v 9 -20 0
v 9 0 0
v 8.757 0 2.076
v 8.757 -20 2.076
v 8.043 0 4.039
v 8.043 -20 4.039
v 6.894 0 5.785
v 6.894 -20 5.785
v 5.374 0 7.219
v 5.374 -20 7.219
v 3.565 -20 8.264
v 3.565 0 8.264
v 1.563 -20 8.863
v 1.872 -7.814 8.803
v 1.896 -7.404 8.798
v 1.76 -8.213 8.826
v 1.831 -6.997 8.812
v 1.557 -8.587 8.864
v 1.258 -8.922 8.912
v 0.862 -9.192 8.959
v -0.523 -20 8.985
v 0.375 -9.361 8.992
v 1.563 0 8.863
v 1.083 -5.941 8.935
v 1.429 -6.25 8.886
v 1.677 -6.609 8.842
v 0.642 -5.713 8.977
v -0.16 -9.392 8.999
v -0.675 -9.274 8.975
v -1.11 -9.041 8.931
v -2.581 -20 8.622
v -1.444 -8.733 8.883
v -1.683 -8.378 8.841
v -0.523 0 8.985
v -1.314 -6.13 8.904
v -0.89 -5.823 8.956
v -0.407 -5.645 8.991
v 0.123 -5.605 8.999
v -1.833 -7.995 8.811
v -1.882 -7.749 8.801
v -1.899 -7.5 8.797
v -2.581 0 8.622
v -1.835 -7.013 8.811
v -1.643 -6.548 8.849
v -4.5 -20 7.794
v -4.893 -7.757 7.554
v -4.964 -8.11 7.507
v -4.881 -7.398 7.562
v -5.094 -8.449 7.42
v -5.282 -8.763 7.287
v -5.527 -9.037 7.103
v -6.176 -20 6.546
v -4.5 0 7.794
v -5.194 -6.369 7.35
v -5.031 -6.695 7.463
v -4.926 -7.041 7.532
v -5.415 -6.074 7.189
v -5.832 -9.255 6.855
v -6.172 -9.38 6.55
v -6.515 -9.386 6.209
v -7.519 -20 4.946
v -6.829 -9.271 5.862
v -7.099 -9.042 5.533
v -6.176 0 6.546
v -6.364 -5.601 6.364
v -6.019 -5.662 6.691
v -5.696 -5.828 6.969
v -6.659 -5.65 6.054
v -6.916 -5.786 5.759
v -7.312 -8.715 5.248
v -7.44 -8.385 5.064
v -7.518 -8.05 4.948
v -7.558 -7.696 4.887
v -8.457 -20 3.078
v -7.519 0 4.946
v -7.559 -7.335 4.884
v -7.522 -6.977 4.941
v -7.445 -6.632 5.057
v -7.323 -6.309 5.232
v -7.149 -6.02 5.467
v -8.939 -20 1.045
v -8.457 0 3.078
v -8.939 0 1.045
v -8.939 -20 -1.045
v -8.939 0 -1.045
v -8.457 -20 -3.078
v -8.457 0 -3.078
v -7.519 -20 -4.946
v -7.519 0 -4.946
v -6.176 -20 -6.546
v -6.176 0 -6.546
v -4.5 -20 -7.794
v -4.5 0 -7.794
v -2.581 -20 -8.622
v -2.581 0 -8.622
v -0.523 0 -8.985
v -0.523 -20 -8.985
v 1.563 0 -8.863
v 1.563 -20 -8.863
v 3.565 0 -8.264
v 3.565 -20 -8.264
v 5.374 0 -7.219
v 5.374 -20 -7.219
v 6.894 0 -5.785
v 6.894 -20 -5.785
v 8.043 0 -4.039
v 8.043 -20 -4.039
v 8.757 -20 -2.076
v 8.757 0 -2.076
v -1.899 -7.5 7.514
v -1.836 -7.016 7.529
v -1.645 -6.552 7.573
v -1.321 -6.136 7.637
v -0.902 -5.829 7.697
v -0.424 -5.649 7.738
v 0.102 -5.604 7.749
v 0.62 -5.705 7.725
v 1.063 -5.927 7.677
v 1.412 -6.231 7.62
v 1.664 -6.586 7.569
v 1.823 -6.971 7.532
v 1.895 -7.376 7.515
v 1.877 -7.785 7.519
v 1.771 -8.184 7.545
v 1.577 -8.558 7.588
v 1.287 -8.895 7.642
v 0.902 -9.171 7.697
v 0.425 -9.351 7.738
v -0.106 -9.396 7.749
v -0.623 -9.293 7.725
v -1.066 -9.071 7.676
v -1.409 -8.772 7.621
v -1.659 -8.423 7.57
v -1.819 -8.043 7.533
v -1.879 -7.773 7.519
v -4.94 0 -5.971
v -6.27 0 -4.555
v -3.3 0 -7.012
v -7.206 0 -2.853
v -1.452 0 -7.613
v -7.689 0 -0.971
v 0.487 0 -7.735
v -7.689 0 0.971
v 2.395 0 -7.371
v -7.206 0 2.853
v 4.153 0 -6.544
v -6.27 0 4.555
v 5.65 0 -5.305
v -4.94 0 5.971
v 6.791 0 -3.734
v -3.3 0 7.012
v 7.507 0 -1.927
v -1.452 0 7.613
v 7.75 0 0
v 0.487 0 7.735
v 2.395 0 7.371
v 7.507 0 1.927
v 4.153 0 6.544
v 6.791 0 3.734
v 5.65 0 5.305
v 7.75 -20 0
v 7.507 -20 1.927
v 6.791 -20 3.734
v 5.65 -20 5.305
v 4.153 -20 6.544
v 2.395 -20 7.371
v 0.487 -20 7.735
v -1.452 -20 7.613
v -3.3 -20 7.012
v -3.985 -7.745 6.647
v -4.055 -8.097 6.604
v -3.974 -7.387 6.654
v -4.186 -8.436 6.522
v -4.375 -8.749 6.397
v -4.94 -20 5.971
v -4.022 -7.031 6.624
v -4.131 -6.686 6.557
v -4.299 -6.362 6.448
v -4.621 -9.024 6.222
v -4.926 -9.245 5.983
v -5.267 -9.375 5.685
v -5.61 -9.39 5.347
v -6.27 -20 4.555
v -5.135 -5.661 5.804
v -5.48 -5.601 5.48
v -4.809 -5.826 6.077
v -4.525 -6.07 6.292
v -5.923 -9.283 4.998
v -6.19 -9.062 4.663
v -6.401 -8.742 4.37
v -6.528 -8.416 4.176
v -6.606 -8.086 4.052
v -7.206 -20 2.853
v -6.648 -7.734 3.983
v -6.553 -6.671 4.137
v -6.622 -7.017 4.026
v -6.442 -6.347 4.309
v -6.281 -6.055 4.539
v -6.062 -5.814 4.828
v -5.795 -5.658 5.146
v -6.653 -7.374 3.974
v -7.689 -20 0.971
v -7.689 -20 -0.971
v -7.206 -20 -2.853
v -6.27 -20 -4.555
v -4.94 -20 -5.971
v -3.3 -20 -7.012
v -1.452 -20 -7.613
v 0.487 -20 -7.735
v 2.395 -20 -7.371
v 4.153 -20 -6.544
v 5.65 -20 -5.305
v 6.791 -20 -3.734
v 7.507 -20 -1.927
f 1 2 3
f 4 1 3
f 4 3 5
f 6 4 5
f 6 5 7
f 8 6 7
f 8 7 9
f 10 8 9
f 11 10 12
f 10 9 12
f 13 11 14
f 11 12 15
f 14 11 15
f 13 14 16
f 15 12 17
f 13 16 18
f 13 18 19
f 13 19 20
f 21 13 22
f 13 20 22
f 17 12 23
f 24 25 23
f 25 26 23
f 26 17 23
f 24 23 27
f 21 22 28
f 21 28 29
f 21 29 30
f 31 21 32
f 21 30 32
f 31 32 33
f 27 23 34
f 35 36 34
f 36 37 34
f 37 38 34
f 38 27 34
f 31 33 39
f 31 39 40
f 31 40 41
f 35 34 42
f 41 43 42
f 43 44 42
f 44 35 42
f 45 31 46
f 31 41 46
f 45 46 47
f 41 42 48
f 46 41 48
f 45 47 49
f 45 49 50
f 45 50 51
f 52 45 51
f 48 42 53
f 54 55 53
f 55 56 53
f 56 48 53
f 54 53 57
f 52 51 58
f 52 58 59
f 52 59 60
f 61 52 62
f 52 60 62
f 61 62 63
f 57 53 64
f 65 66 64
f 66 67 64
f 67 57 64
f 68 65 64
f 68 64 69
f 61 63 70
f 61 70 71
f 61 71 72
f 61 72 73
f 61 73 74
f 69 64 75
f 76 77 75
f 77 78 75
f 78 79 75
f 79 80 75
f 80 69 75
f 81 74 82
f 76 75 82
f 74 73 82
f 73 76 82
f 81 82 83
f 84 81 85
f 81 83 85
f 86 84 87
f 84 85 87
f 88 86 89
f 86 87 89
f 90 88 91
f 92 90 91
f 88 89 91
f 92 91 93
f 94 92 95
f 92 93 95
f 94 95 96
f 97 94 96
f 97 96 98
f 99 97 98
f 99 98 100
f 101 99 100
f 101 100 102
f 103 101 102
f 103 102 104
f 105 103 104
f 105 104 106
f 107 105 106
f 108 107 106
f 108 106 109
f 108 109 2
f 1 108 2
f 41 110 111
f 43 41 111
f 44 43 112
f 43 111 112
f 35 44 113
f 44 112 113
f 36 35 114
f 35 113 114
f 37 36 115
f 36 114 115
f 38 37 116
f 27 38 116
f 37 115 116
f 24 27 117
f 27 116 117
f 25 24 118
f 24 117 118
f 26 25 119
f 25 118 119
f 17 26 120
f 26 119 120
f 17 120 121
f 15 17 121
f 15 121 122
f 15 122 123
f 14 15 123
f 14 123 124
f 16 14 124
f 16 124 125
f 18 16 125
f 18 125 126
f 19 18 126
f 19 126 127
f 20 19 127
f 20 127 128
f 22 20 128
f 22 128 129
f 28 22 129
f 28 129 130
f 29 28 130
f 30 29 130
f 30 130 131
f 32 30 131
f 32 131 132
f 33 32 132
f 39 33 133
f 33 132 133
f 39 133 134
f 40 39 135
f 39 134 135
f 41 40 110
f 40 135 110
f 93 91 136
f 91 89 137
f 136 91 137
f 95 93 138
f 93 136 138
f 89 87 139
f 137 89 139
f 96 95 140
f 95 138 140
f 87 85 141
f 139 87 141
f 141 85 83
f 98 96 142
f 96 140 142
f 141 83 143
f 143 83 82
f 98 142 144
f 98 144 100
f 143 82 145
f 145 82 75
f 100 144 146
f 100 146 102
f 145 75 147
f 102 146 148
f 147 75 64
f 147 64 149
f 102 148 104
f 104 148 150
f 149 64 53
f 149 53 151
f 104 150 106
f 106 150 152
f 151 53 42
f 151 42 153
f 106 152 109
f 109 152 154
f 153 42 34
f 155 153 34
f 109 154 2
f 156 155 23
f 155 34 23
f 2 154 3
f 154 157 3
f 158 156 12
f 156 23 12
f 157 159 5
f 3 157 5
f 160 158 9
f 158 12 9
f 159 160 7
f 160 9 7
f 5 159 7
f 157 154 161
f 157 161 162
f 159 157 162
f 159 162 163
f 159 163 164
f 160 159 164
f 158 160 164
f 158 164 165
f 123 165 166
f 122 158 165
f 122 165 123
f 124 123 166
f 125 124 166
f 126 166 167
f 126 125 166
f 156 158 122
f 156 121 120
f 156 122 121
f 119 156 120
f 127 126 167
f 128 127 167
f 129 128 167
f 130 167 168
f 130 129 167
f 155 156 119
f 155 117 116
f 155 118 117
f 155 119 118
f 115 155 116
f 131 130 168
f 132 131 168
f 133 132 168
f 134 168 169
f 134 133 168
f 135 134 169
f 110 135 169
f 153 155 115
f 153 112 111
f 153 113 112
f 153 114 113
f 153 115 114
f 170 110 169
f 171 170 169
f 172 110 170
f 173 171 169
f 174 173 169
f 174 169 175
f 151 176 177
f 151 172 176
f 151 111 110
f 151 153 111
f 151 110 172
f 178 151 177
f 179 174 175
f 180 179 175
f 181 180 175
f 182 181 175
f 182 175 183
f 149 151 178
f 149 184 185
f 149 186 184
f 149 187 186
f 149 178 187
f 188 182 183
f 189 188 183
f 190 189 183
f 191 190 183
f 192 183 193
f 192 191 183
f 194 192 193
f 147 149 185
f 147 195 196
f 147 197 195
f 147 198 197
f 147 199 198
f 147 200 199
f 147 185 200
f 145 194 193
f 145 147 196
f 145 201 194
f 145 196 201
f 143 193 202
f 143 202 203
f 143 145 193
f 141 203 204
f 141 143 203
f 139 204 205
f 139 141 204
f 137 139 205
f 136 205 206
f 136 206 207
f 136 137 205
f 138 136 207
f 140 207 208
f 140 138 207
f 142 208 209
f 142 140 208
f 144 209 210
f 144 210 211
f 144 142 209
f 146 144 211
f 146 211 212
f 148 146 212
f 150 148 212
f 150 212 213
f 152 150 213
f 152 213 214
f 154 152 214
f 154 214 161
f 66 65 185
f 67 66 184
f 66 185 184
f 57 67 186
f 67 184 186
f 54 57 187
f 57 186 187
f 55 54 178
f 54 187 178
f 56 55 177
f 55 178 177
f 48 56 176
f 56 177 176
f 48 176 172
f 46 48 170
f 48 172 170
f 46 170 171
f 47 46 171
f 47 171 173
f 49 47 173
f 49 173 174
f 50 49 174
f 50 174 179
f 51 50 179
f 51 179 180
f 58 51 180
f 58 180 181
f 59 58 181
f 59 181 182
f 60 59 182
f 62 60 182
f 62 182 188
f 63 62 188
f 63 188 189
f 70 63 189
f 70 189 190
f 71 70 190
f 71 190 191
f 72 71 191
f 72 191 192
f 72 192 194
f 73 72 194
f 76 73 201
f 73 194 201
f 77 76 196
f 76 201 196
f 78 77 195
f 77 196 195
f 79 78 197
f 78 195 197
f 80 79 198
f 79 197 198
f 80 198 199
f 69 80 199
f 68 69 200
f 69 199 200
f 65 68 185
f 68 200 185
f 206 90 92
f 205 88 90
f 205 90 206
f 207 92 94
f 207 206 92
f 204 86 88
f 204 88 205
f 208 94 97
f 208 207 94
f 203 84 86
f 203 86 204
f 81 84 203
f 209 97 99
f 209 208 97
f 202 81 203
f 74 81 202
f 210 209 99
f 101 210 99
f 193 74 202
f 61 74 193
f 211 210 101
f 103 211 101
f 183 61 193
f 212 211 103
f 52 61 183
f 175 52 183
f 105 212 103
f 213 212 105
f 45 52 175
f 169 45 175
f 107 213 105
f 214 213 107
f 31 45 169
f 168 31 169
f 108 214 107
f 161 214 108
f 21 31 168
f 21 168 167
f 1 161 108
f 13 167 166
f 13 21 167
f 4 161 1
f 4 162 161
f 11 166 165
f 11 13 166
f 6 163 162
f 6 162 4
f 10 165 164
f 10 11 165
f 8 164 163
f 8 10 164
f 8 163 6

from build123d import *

# Parameters (mm, degrees)
F0_R     = 9
F0_R_2   = 7.75
F1_DEPTH = 20
F4_D     = 3.7973
F4_DEPTH = 3.021
F4_START = 0.20255
F4_TIP   = 1.1408240143
F8_D     = 3.7973
F8_DEPTH = 2
F8_START = 0.20255
F8_TIP   = 1.1408240143


with BuildPart() as f1:
    # F0 (on Front) → F1 (new body)
    with BuildSketch(Plane.XZ):
        Circle(F0_R)
        Circle(F0_R_2, mode=Mode.SUBTRACT)
    extrude(amount=F1_DEPTH)

    # F4
    # its depths count from where the whole tool has entered the part; down to there all is cleared
    with Locations(Plane.XY.offset(9).offset(-F4_START)):
        with Locations((0, -7.5)):
            Hole(F4_D / 2, depth=F4_DEPTH)
            with Locations((0, 0, -(F4_DEPTH + F4_TIP / 2))):  # 118° drill point
                Cone(0, F4_D / 2, F4_TIP, mode=Mode.SUBTRACT)

    # F8
    # its depths count from where the whole tool has entered the part; down to there all is cleared
    with Locations(Plane(origin=(-6.3639610307, 0, 6.3639610307), x_dir=(0, -1, 0), z_dir=(-0.7071067812, 0, 0.7071067812)).offset(-F8_START)):
        with Locations((7.5, 0)):
            Hole(F8_D / 2, depth=F8_DEPTH)
            with Locations((0, 0, -(F8_DEPTH + F8_TIP / 2))):  # 118° drill point
                Cone(0, F8_D / 2, F8_TIP, mode=Mode.SUBTRACT)


solid = f1.part
